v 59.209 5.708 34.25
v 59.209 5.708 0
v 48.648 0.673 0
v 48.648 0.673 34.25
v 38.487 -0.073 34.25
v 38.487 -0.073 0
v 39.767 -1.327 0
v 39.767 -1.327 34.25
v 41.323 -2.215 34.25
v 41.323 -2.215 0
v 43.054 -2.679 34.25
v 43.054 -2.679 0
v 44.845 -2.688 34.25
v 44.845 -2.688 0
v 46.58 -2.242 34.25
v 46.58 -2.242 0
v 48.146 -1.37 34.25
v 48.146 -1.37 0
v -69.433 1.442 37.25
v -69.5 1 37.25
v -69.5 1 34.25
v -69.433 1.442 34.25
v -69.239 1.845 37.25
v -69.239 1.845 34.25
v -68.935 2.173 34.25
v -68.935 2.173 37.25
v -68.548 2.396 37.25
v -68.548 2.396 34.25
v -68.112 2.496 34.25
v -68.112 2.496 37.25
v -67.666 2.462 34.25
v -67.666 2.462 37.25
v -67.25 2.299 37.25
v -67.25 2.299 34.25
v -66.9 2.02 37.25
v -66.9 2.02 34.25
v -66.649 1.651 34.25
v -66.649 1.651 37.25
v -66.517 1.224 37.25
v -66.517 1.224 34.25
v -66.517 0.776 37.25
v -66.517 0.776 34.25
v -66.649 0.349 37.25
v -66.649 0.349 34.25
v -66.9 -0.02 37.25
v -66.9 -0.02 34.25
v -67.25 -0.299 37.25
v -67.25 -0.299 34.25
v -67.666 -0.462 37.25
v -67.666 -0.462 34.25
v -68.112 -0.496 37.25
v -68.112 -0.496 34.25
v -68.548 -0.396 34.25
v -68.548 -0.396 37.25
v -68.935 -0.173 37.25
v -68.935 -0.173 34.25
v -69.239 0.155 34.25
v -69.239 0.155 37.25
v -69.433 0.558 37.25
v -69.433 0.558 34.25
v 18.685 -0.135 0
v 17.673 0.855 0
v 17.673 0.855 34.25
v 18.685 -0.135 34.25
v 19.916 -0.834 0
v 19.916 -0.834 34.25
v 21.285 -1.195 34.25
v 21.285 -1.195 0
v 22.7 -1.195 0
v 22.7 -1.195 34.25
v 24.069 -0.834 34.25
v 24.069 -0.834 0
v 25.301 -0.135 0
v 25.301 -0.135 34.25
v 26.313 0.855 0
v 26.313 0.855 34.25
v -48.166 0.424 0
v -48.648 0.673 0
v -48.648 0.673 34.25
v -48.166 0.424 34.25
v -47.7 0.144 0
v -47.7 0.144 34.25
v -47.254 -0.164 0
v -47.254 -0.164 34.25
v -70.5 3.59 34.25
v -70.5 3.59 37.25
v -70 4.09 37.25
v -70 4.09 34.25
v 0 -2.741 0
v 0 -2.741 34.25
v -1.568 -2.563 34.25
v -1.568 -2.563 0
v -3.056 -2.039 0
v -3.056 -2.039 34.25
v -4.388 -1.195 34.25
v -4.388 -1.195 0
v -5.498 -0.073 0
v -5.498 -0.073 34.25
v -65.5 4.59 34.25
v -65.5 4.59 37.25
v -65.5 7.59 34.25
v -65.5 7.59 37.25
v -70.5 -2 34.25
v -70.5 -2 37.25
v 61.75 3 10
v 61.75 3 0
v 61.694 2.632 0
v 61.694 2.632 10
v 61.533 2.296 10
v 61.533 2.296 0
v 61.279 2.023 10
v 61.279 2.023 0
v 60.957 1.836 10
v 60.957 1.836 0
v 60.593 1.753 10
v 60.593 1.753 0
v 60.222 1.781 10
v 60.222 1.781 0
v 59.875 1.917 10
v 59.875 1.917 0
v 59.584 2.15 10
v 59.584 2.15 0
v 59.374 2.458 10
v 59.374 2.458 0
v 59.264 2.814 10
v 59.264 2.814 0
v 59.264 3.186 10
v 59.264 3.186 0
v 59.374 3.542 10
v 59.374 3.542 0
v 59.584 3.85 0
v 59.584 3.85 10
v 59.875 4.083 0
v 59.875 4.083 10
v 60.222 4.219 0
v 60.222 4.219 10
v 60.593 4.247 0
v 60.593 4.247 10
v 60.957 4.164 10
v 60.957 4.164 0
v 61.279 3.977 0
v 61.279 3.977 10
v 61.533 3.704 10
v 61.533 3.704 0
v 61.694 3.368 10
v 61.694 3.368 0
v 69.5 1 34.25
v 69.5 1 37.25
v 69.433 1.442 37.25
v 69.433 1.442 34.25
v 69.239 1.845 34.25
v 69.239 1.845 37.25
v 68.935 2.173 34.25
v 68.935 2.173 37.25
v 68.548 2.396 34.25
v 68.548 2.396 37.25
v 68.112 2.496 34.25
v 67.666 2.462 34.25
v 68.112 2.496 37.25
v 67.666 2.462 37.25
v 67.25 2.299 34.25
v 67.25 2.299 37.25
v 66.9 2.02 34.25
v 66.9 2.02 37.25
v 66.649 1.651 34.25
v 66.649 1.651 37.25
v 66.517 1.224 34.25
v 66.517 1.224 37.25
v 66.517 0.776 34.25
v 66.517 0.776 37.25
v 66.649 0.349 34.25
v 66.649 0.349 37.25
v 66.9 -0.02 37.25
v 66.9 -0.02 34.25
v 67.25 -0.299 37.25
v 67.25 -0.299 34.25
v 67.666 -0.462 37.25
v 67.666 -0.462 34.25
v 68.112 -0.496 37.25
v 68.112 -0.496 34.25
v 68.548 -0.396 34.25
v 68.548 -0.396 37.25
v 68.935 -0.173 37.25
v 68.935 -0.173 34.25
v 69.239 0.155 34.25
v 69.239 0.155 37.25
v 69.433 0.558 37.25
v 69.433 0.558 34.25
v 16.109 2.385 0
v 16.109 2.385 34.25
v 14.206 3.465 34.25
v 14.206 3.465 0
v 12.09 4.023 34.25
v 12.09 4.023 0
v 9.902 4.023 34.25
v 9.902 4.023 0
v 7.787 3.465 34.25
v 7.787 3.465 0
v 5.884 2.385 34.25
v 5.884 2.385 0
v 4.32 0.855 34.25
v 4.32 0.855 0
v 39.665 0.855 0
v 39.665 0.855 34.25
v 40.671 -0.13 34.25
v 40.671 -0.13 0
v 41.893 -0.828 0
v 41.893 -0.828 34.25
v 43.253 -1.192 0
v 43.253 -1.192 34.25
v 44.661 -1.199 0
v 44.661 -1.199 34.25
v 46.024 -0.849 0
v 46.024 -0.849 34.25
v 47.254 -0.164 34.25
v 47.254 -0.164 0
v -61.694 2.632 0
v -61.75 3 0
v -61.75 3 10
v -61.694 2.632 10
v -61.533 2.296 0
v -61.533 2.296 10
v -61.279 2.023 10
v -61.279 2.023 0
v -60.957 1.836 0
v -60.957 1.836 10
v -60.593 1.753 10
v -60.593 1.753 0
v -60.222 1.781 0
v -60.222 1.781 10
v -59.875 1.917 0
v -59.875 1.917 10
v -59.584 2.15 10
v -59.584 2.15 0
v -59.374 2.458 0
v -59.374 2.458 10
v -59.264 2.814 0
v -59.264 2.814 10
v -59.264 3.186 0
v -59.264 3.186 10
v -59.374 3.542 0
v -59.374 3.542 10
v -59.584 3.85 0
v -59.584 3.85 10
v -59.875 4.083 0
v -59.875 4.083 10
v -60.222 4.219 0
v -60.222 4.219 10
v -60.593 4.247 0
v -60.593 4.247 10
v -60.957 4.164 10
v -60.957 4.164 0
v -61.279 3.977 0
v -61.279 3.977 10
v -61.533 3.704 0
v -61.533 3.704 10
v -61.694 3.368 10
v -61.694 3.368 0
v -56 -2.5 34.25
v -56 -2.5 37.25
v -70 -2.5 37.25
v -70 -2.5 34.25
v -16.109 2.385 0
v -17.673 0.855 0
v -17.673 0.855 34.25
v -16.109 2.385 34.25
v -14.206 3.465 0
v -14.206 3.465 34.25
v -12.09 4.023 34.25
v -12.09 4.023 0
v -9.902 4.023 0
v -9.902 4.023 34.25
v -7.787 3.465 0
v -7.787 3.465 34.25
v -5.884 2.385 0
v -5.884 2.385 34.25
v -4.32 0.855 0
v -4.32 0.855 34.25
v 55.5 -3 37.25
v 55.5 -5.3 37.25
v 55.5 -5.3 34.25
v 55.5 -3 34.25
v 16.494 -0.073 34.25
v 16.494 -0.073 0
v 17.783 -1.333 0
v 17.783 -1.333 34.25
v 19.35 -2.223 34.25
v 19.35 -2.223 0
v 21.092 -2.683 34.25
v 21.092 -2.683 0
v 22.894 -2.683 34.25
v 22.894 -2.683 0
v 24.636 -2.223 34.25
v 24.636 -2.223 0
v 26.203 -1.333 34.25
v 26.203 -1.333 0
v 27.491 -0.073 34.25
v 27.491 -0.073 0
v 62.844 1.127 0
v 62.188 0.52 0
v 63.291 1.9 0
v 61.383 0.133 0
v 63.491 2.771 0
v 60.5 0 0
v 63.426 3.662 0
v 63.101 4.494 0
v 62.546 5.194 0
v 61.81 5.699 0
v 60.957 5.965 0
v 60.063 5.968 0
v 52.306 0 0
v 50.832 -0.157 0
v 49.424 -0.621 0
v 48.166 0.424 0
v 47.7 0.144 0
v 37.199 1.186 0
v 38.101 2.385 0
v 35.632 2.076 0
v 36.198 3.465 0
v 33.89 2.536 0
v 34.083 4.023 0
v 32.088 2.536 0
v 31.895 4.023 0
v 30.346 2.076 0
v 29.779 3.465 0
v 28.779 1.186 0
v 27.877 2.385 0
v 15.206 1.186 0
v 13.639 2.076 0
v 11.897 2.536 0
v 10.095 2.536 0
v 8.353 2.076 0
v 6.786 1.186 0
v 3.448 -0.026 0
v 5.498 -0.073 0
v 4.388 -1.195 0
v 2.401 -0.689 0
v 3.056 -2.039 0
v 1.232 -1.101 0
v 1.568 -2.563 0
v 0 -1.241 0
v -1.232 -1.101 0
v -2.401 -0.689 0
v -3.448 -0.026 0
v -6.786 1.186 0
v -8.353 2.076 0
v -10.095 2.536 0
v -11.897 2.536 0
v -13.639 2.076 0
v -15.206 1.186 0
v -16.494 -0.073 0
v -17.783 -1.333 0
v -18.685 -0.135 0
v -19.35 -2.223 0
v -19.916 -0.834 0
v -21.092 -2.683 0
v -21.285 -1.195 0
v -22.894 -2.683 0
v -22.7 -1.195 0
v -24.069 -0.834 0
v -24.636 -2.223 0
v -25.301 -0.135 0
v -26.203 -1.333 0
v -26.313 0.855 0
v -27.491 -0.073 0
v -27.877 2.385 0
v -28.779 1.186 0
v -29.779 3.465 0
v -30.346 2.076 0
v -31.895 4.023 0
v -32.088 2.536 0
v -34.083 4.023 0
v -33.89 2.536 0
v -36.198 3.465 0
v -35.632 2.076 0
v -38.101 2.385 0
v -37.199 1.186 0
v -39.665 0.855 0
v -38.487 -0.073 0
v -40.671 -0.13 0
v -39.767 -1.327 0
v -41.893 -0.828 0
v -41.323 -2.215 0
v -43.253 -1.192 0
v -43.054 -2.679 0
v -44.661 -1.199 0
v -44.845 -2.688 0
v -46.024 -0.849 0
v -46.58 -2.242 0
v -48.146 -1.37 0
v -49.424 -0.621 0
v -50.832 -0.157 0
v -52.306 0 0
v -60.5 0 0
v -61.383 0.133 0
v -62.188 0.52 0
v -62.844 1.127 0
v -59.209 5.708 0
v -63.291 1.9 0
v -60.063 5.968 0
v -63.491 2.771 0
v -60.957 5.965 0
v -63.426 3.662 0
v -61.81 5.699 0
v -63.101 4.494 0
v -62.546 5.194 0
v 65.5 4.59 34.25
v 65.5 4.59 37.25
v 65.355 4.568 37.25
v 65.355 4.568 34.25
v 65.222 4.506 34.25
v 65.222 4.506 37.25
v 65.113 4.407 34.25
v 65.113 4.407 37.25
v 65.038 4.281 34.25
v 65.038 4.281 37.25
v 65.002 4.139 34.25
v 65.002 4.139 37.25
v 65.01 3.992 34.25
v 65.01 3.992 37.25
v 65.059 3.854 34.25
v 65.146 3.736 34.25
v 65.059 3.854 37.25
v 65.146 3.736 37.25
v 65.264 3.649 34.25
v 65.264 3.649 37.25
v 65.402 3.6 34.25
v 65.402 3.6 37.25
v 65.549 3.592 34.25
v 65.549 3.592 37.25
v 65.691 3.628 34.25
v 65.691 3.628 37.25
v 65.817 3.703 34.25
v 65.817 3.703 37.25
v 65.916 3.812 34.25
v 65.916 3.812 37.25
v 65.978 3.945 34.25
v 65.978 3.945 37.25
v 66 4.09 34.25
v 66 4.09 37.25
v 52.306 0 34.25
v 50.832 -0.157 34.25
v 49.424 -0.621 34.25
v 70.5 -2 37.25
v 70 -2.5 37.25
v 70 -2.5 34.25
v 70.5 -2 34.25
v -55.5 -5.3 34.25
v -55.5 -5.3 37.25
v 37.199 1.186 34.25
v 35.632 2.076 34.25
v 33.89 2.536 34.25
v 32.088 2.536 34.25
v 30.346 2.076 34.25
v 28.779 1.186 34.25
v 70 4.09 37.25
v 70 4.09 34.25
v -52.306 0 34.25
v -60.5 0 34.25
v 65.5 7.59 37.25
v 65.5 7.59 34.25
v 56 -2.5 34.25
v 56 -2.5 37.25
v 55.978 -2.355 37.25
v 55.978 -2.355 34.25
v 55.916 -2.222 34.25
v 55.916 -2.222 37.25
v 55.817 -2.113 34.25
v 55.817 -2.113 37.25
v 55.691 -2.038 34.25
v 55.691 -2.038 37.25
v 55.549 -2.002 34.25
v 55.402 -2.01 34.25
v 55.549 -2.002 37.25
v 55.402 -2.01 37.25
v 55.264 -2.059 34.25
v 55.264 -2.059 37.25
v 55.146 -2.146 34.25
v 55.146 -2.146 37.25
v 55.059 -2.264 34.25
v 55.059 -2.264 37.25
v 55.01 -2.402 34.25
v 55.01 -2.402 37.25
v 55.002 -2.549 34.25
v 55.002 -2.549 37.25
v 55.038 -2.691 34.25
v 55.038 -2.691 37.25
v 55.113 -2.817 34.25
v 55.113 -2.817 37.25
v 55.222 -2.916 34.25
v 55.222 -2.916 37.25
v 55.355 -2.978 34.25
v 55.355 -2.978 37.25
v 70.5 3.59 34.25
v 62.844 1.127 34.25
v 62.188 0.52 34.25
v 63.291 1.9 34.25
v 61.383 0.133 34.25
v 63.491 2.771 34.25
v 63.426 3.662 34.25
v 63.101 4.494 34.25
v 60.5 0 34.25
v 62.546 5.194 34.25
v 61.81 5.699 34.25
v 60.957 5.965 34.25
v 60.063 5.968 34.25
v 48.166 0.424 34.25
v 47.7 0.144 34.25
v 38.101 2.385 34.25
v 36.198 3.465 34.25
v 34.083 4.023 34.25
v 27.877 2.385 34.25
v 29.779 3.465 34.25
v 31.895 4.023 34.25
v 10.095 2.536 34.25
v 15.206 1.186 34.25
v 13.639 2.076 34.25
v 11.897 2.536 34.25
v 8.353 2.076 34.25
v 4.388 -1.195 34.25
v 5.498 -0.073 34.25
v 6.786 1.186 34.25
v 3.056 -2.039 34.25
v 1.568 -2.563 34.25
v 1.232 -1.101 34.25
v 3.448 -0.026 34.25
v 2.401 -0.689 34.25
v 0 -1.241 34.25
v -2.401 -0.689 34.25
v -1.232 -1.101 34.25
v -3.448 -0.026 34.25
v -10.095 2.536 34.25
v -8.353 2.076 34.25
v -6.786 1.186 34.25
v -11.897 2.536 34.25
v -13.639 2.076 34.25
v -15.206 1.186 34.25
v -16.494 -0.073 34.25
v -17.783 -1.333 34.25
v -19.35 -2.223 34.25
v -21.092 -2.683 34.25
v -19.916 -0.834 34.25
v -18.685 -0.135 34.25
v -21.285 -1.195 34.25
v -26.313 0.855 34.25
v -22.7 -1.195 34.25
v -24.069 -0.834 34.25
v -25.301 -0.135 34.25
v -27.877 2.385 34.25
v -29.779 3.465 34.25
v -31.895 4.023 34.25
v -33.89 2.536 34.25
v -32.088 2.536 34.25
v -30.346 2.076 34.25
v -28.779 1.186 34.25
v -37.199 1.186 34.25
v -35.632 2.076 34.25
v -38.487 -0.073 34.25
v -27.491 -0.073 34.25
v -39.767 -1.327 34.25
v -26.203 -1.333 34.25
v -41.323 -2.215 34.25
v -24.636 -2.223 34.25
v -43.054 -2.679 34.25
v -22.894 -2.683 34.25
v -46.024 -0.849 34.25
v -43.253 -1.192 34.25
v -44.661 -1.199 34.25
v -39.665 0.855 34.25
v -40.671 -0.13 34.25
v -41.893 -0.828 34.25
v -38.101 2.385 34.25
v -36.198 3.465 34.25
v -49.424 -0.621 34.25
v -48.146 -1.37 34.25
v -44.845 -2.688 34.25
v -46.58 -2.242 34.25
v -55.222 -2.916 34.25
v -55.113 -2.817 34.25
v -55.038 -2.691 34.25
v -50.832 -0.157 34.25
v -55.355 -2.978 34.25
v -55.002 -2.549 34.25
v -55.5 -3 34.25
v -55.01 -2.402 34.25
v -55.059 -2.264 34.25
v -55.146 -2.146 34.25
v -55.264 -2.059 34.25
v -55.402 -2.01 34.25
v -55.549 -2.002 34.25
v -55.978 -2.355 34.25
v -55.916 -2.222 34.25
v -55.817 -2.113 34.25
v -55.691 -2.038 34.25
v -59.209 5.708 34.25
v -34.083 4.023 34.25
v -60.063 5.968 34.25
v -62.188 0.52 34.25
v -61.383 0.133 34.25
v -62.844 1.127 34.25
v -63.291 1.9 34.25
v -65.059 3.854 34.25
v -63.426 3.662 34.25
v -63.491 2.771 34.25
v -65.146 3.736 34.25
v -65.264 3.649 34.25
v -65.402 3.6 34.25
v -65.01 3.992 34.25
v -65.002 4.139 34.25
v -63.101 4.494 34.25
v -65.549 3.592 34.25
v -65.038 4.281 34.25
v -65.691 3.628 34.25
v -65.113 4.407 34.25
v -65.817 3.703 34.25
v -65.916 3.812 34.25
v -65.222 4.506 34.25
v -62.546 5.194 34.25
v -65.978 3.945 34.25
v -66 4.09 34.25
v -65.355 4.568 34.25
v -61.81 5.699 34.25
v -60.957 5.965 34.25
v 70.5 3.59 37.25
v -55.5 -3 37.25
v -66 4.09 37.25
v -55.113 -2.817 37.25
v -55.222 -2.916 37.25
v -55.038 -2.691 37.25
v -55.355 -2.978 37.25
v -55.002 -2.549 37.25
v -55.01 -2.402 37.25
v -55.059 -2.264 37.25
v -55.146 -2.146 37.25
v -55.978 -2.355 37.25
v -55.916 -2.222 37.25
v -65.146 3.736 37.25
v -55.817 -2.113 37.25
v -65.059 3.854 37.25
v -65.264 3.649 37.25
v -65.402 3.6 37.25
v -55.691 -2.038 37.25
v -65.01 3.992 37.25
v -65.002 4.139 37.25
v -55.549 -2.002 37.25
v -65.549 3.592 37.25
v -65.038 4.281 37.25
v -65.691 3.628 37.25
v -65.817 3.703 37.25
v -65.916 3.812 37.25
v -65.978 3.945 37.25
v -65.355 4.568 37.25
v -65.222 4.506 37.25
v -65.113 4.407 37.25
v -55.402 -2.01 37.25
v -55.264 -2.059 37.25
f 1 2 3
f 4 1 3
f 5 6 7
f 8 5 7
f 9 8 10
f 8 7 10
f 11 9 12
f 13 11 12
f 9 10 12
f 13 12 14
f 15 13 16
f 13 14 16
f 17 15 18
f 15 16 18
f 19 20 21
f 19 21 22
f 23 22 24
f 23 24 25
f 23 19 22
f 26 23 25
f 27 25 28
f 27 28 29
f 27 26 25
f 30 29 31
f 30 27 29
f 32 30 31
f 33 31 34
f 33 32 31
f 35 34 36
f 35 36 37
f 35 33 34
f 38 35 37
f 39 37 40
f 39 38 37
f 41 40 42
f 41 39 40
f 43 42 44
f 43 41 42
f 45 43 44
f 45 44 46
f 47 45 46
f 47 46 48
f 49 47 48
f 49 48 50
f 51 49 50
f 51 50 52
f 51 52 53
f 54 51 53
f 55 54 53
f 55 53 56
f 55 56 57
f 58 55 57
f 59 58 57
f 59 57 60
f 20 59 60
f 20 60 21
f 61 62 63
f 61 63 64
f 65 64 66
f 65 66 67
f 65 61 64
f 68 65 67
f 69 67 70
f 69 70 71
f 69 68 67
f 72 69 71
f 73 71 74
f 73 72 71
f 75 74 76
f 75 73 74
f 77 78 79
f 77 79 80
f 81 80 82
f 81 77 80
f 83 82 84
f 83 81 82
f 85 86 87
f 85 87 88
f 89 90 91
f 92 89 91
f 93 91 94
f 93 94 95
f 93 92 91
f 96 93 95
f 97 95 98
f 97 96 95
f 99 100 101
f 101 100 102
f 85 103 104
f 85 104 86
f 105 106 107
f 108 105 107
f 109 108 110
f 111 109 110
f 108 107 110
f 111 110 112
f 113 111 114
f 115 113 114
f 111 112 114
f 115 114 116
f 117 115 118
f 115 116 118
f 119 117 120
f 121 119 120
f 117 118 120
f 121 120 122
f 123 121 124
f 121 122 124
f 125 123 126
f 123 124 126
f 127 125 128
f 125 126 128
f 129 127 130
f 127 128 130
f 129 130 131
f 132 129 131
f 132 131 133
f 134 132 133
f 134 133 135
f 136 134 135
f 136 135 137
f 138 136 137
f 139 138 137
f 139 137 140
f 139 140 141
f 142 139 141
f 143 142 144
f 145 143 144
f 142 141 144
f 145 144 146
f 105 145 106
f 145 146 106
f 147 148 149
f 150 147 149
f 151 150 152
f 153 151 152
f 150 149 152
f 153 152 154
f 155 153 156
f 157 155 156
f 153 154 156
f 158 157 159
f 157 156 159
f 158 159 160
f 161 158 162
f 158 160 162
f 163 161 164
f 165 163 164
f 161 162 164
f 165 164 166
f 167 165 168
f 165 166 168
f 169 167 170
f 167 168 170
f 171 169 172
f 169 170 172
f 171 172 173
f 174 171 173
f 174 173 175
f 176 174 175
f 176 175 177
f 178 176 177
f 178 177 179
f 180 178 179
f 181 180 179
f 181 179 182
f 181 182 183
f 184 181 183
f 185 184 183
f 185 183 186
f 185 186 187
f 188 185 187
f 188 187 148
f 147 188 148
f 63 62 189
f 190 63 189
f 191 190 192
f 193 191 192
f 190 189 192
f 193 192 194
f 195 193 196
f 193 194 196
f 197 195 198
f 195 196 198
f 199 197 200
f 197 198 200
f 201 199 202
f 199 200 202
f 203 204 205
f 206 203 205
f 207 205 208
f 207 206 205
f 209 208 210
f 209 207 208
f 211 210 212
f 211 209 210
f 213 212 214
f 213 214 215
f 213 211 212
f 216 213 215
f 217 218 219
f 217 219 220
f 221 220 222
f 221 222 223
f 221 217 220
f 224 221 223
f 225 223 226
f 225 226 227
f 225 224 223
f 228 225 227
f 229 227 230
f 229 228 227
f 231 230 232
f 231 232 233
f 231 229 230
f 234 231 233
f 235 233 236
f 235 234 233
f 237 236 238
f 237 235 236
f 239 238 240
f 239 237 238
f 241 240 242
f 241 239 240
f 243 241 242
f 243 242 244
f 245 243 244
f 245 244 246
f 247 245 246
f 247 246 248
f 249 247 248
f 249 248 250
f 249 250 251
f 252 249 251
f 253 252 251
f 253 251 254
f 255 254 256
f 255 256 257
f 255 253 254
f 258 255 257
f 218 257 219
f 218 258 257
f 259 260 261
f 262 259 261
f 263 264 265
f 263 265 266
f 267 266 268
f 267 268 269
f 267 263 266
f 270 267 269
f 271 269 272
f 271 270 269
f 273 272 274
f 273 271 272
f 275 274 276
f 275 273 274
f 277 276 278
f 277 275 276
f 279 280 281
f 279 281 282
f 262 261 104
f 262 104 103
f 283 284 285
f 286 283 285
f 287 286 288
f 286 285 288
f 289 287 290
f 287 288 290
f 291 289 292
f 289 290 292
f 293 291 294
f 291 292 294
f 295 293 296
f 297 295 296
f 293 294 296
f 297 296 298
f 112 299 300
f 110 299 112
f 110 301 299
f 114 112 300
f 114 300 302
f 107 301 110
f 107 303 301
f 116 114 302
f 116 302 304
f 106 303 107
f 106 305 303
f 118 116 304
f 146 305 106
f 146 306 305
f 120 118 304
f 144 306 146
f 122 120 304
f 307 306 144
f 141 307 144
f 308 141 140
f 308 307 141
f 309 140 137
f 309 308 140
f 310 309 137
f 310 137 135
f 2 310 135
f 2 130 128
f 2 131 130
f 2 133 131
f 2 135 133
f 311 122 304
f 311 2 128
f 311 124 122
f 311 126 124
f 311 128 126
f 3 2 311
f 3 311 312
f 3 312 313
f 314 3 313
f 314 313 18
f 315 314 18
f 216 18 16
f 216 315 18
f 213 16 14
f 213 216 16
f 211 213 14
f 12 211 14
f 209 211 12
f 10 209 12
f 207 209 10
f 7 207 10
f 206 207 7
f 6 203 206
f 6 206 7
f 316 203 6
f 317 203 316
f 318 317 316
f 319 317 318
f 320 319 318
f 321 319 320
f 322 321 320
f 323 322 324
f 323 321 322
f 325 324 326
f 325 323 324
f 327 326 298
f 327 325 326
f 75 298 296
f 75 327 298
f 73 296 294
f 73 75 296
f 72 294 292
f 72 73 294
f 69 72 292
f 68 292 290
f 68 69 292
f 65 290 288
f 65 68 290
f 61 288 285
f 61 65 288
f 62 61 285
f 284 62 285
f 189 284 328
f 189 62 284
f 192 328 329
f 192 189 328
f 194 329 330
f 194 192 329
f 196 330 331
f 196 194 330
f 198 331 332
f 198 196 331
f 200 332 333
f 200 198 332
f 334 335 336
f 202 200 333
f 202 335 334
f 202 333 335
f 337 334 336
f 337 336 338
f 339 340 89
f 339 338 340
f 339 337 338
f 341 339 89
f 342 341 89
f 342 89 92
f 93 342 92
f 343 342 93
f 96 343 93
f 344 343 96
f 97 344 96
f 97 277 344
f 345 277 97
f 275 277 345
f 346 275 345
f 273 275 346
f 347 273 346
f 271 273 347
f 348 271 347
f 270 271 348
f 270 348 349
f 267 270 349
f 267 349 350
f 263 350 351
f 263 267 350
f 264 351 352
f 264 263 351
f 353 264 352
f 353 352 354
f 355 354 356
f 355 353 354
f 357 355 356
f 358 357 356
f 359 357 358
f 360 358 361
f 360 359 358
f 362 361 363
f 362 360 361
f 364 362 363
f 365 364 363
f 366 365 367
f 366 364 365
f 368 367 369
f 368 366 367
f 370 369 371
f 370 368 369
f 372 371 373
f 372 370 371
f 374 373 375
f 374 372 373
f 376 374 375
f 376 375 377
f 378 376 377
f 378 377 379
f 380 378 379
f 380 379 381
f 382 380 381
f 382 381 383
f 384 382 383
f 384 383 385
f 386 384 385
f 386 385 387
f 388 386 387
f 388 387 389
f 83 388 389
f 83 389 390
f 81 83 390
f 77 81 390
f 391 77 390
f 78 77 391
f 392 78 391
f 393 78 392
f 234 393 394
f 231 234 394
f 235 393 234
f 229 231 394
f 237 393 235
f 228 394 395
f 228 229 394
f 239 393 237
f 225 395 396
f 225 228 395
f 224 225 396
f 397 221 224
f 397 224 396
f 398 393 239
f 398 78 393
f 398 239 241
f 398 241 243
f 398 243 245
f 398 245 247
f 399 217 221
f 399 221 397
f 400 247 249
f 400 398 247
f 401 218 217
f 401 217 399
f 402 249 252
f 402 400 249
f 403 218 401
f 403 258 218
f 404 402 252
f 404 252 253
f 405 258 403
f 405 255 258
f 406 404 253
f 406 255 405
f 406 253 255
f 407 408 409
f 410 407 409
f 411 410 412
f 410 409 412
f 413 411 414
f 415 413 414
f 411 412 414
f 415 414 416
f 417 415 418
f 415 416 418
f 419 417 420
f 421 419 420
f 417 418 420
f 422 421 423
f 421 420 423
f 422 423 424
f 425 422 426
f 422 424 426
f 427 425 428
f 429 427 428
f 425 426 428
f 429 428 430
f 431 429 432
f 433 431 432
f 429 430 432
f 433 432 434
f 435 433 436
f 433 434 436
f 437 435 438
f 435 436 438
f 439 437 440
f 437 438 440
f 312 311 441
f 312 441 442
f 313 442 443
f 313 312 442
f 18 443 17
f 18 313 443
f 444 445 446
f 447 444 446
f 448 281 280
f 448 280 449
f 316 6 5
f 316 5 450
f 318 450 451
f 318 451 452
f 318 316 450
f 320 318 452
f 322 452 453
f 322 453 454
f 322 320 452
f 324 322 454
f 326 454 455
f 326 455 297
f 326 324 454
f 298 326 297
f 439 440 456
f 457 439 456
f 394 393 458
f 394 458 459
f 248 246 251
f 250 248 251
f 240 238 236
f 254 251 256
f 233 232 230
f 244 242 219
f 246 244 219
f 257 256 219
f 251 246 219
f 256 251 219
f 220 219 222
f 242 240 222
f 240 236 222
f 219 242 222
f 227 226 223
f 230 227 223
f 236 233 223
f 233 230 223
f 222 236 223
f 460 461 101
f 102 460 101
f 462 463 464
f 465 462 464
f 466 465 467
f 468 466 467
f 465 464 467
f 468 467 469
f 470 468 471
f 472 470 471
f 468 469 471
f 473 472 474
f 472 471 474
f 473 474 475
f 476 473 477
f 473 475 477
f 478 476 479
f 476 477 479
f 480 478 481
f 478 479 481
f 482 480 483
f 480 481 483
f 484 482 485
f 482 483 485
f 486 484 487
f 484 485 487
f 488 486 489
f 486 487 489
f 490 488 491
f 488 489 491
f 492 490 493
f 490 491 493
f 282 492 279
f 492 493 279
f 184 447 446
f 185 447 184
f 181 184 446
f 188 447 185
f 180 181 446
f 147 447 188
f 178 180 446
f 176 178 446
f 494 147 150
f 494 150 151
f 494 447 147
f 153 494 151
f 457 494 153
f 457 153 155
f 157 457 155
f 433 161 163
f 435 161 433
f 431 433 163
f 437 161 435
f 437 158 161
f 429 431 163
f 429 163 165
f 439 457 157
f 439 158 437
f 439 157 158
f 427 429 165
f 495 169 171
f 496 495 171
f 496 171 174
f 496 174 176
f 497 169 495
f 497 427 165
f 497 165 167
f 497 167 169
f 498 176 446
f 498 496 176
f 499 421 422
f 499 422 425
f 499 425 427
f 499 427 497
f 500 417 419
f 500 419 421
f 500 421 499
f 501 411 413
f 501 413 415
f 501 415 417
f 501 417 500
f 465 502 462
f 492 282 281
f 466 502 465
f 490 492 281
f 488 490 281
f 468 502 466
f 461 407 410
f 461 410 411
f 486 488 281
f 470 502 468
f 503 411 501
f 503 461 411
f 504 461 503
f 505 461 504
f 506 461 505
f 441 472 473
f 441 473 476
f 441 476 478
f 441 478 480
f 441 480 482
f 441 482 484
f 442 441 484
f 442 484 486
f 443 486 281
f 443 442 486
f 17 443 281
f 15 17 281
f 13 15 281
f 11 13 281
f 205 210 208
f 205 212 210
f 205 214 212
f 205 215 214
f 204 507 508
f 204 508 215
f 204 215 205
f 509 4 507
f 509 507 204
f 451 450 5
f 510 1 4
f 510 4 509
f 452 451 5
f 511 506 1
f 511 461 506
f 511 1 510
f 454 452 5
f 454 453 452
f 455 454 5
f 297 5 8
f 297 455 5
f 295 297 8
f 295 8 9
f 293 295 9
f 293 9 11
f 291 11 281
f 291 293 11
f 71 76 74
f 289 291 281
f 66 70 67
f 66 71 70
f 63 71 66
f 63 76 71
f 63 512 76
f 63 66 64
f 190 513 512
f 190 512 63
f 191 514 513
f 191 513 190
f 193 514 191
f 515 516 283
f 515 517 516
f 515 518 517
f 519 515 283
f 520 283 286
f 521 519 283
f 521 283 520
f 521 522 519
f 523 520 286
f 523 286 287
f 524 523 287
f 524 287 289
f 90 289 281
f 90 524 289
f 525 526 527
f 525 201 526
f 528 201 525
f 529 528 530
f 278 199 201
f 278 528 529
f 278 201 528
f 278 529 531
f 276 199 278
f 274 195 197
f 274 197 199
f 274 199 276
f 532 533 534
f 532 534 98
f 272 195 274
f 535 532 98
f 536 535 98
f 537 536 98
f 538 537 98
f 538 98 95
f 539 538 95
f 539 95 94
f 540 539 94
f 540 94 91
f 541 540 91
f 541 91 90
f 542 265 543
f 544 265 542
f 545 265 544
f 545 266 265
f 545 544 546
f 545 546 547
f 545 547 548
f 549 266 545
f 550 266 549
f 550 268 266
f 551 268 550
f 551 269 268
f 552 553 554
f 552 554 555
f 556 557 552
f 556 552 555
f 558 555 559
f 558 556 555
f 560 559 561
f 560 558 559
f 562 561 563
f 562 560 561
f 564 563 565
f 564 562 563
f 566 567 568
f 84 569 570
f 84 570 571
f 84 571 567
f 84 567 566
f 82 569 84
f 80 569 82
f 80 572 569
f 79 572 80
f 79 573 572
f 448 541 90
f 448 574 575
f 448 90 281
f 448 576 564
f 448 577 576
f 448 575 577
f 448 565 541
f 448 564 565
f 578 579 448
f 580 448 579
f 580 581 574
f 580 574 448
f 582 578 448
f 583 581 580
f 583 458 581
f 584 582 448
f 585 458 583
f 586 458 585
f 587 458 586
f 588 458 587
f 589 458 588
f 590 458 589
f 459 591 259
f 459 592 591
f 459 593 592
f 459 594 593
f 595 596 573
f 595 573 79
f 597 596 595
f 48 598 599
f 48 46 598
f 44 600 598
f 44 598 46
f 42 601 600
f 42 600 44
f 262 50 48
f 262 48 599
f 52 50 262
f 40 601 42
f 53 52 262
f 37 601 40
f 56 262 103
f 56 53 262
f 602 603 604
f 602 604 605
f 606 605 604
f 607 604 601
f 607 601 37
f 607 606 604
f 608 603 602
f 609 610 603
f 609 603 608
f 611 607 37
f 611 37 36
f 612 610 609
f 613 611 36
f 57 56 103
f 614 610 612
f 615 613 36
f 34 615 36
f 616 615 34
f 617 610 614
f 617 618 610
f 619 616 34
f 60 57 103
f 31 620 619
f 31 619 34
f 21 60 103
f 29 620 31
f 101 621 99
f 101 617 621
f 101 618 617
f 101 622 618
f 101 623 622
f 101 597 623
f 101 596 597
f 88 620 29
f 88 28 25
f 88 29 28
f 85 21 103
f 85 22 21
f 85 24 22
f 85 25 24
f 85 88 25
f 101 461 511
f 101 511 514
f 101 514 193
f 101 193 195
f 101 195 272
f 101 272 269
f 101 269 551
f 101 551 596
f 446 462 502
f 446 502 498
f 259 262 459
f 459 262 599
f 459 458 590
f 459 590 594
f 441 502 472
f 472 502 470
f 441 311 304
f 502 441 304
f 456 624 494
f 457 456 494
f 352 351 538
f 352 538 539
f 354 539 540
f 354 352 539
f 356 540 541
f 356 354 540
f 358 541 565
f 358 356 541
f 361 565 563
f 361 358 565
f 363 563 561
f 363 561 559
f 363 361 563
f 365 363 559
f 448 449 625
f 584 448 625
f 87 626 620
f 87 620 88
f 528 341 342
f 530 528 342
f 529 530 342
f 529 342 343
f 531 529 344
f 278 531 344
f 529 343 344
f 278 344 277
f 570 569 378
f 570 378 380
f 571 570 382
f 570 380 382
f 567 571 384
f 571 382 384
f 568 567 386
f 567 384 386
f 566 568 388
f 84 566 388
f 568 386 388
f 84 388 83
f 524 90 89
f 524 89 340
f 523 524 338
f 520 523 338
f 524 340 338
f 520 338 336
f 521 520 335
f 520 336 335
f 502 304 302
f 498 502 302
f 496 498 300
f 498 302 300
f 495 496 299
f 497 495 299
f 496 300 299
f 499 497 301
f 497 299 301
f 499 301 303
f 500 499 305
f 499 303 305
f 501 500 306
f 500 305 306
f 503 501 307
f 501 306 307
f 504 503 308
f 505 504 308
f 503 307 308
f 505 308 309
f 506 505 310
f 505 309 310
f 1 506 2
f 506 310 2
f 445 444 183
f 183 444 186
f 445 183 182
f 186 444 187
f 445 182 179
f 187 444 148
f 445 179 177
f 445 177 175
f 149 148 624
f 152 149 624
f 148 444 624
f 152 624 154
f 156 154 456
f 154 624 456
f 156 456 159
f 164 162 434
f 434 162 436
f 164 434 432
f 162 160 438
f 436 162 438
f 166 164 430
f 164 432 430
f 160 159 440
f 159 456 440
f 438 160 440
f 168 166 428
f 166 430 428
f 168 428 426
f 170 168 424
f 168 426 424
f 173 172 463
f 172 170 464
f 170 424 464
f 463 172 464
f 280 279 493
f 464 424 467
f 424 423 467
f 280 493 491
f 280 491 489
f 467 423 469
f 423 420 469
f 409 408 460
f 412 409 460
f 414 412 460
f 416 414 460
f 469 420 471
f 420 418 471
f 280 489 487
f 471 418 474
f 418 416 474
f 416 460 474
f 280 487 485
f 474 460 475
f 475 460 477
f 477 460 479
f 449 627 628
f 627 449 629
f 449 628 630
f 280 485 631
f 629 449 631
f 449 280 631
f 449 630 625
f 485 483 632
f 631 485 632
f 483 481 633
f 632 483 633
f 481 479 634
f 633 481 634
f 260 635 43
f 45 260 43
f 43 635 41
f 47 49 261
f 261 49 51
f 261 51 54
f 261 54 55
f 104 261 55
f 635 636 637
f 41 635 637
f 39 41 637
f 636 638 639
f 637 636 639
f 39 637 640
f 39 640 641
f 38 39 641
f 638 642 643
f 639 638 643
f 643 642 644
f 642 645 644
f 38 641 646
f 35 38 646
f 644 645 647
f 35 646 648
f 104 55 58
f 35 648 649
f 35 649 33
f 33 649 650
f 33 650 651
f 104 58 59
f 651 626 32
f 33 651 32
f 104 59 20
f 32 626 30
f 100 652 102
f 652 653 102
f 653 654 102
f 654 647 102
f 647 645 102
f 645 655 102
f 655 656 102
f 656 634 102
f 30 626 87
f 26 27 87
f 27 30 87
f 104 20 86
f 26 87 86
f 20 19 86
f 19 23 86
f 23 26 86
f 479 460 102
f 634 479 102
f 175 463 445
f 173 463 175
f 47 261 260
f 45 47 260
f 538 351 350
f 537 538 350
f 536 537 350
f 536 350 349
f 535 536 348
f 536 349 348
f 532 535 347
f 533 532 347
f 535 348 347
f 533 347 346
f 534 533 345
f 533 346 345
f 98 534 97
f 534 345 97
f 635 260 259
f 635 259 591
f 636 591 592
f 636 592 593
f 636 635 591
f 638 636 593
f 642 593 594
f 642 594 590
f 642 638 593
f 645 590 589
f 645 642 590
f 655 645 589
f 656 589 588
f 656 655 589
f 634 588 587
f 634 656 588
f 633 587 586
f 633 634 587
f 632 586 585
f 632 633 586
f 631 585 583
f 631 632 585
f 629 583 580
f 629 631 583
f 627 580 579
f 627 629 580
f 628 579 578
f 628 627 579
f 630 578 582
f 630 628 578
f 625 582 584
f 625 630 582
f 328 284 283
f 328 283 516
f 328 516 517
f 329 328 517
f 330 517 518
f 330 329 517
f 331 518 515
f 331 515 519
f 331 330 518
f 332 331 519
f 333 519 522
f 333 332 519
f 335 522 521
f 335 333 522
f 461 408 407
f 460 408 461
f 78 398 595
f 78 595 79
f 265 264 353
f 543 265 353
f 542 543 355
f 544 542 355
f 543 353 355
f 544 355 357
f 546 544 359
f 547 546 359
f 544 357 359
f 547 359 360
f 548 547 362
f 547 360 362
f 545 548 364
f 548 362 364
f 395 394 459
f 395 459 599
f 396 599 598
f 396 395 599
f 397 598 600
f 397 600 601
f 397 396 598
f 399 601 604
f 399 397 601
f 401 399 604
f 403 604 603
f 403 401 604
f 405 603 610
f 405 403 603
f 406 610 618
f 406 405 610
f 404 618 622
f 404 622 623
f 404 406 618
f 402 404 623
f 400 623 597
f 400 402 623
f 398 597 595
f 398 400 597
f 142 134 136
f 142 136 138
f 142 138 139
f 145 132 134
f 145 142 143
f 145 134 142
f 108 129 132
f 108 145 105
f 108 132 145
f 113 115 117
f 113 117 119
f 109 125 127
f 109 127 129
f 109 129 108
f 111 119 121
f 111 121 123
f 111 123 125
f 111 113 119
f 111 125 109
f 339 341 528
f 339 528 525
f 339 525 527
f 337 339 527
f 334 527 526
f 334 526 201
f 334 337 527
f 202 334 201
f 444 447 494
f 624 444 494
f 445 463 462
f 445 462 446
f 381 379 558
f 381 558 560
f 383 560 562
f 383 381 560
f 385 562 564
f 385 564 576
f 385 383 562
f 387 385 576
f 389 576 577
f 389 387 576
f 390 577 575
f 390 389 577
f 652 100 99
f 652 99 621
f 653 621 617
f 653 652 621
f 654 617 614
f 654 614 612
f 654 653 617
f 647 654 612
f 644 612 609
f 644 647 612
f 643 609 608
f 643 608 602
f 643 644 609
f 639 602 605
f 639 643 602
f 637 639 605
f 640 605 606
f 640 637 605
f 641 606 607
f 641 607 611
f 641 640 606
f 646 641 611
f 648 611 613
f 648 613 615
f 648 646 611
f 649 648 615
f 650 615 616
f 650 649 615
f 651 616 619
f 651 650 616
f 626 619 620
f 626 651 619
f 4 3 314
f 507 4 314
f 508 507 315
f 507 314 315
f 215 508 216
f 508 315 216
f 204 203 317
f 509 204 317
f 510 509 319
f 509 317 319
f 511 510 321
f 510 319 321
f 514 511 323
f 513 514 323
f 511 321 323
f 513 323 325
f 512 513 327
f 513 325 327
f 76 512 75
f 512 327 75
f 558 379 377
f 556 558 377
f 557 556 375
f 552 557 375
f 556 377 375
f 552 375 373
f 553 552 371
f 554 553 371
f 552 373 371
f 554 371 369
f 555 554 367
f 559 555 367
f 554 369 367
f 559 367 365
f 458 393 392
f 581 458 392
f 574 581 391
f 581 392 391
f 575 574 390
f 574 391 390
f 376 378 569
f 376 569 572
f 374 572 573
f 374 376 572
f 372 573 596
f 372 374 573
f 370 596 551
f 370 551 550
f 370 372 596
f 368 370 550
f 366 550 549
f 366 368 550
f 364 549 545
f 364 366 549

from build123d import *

# Parameters (mm, degrees)
PAD_DEPTH       = 34.25
SKETCH001_R     = 1.25
POCKET_DEPTH    = 10
SKETCH002_W     = 70.5
SKETCH002_H     = 12.89
PAD001_DEPTH    = 3
SKETCH003_W     = 15
SKETCH003_H     = 2.8
POCKET001_DEPTH = 37.251
SKETCH004_W     = 5
SKETCH004_H     = 3.5
POCKET002_DEPTH = 37.251
SKETCH005_R     = 1.5
POCKET003_DEPTH = 37.251
SKETCH006_R     = 0.5
POCKET004_DEPTH = 37.251
CHAMFER_SIZE    = 0.5


with BuildPart() as part:
    # Sketch → Pad (new body)
    with BuildSketch(Plane.XY):
        with BuildLine():
            Line((52.305921, 0), (60.5, 0))
            ThreePointArc((60.5, 0), (63.426078, 3.661869), (59.208881, 5.707953))
            Line((59.208881, 5.707953), (48.64775, 0.672534))
            ThreePointArc((48.64775, 0.672534), (47.930845, 0.287572), (47.254036, -0.164179))
            ThreePointArc((39.665197, 0.854908), (43.253158, -1.19207), (47.254036, -0.164179))
            ThreePointArc((39.665197, 0.854908), (32.988877, 4.094039), (26.312556, 0.854908))
            ThreePointArc((17.672613, 0.854908), (21.992584, -1.241), (26.312556, 0.854908))
            ThreePointArc((17.672613, 0.854908), (10.996292, 4.094039), (4.319972, 0.854908))
            ThreePointArc((0, -1.241), (2.400781, -0.689359), (4.319972, 0.854908))
            Line((0, -2.741), (0, -1.241))
            ThreePointArc((0, -2.741), (3.055539, -2.038911), (5.498146, -0.073481))
            ThreePointArc((16.494438, -0.073481), (10.996292, 2.594039), (5.498146, -0.073481))
            ThreePointArc((16.494438, -0.073481), (21.992584, -2.741), (27.490731, -0.073481))
            ThreePointArc((38.487023, -0.073481), (32.988877, 2.594039), (27.490731, -0.073481))
            ThreePointArc((38.487023, -0.073481), (43.053519, -2.678725), (48.145545, -1.3705))
            ThreePointArc((52.305921, 0), (50.115773, -0.351448), (48.145545, -1.3705))
        make_face()
    extrude(amount=PAD_DEPTH)

    # Sketch001 (on Face17 of Pad) → Pocket (cut)
    with BuildSketch(Plane(origin=(0, 0, 0), x_dir=(1, 0, 0), z_dir=(0, 0, -1))):
        with Locations((60.5, -3)):
            Circle(SKETCH001_R)
    extrude(amount=-POCKET_DEPTH, mode=Mode.SUBTRACT)

    # Sketch002 (on Face5 of Pocket) → Pad001 (join)
    with BuildSketch(Plane.XY.offset(34.25)):
        with Locations((35.25, 1.145)):
            Rectangle(SKETCH002_W, SKETCH002_H)
    extrude(amount=PAD001_DEPTH)

    # Sketch003 (on Face23 of Pad001) → Pocket001 (cut, through all)
    with BuildSketch(Plane.XY.offset(37.25)):
        with Locations((63, -3.9)):
            Rectangle(SKETCH003_W, SKETCH003_H)
    extrude(amount=-POCKET001_DEPTH, mode=Mode.SUBTRACT)

    # Sketch004 (on Face25 of Pocket001) → Pocket002 (cut, through all)
    with BuildSketch(Plane.XY.offset(37.25)):
        with Locations((68, 5.84)):
            Rectangle(SKETCH004_W, SKETCH004_H)
    extrude(amount=-POCKET002_DEPTH, mode=Mode.SUBTRACT)

    # Sketch005 (on Face27 of Pocket002) → Pocket003 (cut, through all)
    with BuildSketch(Plane.XY.offset(37.25)):
        with Locations((68, 1)):
            Circle(SKETCH005_R)
    extrude(amount=-POCKET003_DEPTH, mode=Mode.SUBTRACT)

    # Sketch006 (on Face28 of Pocket003) → Pocket004 (cut, through all)
    with BuildSketch(Plane.XY.offset(37.25)):
        with Locations((65.5, 4.09)):
            Circle(SKETCH006_R)
        with Locations((55.5, -2.5)):
            Circle(SKETCH006_R)
    extrude(amount=-POCKET004_DEPTH, mode=Mode.SUBTRACT)

    # Chamfer
    chamfer_edges = [part.edges().sort_by_distance(p)[0] for p in [
        (70.5, 4.09, 35.75),
        (70.5, -2.5, 35.75),
    ]]
    chamfer(chamfer_edges, length=CHAMFER_SIZE)

    # Mirrored: part across YZ


with BuildPart() as part_1:
    add(part.part)
    add(part.part.mirror(Plane.YZ))


solid = part_1.part
